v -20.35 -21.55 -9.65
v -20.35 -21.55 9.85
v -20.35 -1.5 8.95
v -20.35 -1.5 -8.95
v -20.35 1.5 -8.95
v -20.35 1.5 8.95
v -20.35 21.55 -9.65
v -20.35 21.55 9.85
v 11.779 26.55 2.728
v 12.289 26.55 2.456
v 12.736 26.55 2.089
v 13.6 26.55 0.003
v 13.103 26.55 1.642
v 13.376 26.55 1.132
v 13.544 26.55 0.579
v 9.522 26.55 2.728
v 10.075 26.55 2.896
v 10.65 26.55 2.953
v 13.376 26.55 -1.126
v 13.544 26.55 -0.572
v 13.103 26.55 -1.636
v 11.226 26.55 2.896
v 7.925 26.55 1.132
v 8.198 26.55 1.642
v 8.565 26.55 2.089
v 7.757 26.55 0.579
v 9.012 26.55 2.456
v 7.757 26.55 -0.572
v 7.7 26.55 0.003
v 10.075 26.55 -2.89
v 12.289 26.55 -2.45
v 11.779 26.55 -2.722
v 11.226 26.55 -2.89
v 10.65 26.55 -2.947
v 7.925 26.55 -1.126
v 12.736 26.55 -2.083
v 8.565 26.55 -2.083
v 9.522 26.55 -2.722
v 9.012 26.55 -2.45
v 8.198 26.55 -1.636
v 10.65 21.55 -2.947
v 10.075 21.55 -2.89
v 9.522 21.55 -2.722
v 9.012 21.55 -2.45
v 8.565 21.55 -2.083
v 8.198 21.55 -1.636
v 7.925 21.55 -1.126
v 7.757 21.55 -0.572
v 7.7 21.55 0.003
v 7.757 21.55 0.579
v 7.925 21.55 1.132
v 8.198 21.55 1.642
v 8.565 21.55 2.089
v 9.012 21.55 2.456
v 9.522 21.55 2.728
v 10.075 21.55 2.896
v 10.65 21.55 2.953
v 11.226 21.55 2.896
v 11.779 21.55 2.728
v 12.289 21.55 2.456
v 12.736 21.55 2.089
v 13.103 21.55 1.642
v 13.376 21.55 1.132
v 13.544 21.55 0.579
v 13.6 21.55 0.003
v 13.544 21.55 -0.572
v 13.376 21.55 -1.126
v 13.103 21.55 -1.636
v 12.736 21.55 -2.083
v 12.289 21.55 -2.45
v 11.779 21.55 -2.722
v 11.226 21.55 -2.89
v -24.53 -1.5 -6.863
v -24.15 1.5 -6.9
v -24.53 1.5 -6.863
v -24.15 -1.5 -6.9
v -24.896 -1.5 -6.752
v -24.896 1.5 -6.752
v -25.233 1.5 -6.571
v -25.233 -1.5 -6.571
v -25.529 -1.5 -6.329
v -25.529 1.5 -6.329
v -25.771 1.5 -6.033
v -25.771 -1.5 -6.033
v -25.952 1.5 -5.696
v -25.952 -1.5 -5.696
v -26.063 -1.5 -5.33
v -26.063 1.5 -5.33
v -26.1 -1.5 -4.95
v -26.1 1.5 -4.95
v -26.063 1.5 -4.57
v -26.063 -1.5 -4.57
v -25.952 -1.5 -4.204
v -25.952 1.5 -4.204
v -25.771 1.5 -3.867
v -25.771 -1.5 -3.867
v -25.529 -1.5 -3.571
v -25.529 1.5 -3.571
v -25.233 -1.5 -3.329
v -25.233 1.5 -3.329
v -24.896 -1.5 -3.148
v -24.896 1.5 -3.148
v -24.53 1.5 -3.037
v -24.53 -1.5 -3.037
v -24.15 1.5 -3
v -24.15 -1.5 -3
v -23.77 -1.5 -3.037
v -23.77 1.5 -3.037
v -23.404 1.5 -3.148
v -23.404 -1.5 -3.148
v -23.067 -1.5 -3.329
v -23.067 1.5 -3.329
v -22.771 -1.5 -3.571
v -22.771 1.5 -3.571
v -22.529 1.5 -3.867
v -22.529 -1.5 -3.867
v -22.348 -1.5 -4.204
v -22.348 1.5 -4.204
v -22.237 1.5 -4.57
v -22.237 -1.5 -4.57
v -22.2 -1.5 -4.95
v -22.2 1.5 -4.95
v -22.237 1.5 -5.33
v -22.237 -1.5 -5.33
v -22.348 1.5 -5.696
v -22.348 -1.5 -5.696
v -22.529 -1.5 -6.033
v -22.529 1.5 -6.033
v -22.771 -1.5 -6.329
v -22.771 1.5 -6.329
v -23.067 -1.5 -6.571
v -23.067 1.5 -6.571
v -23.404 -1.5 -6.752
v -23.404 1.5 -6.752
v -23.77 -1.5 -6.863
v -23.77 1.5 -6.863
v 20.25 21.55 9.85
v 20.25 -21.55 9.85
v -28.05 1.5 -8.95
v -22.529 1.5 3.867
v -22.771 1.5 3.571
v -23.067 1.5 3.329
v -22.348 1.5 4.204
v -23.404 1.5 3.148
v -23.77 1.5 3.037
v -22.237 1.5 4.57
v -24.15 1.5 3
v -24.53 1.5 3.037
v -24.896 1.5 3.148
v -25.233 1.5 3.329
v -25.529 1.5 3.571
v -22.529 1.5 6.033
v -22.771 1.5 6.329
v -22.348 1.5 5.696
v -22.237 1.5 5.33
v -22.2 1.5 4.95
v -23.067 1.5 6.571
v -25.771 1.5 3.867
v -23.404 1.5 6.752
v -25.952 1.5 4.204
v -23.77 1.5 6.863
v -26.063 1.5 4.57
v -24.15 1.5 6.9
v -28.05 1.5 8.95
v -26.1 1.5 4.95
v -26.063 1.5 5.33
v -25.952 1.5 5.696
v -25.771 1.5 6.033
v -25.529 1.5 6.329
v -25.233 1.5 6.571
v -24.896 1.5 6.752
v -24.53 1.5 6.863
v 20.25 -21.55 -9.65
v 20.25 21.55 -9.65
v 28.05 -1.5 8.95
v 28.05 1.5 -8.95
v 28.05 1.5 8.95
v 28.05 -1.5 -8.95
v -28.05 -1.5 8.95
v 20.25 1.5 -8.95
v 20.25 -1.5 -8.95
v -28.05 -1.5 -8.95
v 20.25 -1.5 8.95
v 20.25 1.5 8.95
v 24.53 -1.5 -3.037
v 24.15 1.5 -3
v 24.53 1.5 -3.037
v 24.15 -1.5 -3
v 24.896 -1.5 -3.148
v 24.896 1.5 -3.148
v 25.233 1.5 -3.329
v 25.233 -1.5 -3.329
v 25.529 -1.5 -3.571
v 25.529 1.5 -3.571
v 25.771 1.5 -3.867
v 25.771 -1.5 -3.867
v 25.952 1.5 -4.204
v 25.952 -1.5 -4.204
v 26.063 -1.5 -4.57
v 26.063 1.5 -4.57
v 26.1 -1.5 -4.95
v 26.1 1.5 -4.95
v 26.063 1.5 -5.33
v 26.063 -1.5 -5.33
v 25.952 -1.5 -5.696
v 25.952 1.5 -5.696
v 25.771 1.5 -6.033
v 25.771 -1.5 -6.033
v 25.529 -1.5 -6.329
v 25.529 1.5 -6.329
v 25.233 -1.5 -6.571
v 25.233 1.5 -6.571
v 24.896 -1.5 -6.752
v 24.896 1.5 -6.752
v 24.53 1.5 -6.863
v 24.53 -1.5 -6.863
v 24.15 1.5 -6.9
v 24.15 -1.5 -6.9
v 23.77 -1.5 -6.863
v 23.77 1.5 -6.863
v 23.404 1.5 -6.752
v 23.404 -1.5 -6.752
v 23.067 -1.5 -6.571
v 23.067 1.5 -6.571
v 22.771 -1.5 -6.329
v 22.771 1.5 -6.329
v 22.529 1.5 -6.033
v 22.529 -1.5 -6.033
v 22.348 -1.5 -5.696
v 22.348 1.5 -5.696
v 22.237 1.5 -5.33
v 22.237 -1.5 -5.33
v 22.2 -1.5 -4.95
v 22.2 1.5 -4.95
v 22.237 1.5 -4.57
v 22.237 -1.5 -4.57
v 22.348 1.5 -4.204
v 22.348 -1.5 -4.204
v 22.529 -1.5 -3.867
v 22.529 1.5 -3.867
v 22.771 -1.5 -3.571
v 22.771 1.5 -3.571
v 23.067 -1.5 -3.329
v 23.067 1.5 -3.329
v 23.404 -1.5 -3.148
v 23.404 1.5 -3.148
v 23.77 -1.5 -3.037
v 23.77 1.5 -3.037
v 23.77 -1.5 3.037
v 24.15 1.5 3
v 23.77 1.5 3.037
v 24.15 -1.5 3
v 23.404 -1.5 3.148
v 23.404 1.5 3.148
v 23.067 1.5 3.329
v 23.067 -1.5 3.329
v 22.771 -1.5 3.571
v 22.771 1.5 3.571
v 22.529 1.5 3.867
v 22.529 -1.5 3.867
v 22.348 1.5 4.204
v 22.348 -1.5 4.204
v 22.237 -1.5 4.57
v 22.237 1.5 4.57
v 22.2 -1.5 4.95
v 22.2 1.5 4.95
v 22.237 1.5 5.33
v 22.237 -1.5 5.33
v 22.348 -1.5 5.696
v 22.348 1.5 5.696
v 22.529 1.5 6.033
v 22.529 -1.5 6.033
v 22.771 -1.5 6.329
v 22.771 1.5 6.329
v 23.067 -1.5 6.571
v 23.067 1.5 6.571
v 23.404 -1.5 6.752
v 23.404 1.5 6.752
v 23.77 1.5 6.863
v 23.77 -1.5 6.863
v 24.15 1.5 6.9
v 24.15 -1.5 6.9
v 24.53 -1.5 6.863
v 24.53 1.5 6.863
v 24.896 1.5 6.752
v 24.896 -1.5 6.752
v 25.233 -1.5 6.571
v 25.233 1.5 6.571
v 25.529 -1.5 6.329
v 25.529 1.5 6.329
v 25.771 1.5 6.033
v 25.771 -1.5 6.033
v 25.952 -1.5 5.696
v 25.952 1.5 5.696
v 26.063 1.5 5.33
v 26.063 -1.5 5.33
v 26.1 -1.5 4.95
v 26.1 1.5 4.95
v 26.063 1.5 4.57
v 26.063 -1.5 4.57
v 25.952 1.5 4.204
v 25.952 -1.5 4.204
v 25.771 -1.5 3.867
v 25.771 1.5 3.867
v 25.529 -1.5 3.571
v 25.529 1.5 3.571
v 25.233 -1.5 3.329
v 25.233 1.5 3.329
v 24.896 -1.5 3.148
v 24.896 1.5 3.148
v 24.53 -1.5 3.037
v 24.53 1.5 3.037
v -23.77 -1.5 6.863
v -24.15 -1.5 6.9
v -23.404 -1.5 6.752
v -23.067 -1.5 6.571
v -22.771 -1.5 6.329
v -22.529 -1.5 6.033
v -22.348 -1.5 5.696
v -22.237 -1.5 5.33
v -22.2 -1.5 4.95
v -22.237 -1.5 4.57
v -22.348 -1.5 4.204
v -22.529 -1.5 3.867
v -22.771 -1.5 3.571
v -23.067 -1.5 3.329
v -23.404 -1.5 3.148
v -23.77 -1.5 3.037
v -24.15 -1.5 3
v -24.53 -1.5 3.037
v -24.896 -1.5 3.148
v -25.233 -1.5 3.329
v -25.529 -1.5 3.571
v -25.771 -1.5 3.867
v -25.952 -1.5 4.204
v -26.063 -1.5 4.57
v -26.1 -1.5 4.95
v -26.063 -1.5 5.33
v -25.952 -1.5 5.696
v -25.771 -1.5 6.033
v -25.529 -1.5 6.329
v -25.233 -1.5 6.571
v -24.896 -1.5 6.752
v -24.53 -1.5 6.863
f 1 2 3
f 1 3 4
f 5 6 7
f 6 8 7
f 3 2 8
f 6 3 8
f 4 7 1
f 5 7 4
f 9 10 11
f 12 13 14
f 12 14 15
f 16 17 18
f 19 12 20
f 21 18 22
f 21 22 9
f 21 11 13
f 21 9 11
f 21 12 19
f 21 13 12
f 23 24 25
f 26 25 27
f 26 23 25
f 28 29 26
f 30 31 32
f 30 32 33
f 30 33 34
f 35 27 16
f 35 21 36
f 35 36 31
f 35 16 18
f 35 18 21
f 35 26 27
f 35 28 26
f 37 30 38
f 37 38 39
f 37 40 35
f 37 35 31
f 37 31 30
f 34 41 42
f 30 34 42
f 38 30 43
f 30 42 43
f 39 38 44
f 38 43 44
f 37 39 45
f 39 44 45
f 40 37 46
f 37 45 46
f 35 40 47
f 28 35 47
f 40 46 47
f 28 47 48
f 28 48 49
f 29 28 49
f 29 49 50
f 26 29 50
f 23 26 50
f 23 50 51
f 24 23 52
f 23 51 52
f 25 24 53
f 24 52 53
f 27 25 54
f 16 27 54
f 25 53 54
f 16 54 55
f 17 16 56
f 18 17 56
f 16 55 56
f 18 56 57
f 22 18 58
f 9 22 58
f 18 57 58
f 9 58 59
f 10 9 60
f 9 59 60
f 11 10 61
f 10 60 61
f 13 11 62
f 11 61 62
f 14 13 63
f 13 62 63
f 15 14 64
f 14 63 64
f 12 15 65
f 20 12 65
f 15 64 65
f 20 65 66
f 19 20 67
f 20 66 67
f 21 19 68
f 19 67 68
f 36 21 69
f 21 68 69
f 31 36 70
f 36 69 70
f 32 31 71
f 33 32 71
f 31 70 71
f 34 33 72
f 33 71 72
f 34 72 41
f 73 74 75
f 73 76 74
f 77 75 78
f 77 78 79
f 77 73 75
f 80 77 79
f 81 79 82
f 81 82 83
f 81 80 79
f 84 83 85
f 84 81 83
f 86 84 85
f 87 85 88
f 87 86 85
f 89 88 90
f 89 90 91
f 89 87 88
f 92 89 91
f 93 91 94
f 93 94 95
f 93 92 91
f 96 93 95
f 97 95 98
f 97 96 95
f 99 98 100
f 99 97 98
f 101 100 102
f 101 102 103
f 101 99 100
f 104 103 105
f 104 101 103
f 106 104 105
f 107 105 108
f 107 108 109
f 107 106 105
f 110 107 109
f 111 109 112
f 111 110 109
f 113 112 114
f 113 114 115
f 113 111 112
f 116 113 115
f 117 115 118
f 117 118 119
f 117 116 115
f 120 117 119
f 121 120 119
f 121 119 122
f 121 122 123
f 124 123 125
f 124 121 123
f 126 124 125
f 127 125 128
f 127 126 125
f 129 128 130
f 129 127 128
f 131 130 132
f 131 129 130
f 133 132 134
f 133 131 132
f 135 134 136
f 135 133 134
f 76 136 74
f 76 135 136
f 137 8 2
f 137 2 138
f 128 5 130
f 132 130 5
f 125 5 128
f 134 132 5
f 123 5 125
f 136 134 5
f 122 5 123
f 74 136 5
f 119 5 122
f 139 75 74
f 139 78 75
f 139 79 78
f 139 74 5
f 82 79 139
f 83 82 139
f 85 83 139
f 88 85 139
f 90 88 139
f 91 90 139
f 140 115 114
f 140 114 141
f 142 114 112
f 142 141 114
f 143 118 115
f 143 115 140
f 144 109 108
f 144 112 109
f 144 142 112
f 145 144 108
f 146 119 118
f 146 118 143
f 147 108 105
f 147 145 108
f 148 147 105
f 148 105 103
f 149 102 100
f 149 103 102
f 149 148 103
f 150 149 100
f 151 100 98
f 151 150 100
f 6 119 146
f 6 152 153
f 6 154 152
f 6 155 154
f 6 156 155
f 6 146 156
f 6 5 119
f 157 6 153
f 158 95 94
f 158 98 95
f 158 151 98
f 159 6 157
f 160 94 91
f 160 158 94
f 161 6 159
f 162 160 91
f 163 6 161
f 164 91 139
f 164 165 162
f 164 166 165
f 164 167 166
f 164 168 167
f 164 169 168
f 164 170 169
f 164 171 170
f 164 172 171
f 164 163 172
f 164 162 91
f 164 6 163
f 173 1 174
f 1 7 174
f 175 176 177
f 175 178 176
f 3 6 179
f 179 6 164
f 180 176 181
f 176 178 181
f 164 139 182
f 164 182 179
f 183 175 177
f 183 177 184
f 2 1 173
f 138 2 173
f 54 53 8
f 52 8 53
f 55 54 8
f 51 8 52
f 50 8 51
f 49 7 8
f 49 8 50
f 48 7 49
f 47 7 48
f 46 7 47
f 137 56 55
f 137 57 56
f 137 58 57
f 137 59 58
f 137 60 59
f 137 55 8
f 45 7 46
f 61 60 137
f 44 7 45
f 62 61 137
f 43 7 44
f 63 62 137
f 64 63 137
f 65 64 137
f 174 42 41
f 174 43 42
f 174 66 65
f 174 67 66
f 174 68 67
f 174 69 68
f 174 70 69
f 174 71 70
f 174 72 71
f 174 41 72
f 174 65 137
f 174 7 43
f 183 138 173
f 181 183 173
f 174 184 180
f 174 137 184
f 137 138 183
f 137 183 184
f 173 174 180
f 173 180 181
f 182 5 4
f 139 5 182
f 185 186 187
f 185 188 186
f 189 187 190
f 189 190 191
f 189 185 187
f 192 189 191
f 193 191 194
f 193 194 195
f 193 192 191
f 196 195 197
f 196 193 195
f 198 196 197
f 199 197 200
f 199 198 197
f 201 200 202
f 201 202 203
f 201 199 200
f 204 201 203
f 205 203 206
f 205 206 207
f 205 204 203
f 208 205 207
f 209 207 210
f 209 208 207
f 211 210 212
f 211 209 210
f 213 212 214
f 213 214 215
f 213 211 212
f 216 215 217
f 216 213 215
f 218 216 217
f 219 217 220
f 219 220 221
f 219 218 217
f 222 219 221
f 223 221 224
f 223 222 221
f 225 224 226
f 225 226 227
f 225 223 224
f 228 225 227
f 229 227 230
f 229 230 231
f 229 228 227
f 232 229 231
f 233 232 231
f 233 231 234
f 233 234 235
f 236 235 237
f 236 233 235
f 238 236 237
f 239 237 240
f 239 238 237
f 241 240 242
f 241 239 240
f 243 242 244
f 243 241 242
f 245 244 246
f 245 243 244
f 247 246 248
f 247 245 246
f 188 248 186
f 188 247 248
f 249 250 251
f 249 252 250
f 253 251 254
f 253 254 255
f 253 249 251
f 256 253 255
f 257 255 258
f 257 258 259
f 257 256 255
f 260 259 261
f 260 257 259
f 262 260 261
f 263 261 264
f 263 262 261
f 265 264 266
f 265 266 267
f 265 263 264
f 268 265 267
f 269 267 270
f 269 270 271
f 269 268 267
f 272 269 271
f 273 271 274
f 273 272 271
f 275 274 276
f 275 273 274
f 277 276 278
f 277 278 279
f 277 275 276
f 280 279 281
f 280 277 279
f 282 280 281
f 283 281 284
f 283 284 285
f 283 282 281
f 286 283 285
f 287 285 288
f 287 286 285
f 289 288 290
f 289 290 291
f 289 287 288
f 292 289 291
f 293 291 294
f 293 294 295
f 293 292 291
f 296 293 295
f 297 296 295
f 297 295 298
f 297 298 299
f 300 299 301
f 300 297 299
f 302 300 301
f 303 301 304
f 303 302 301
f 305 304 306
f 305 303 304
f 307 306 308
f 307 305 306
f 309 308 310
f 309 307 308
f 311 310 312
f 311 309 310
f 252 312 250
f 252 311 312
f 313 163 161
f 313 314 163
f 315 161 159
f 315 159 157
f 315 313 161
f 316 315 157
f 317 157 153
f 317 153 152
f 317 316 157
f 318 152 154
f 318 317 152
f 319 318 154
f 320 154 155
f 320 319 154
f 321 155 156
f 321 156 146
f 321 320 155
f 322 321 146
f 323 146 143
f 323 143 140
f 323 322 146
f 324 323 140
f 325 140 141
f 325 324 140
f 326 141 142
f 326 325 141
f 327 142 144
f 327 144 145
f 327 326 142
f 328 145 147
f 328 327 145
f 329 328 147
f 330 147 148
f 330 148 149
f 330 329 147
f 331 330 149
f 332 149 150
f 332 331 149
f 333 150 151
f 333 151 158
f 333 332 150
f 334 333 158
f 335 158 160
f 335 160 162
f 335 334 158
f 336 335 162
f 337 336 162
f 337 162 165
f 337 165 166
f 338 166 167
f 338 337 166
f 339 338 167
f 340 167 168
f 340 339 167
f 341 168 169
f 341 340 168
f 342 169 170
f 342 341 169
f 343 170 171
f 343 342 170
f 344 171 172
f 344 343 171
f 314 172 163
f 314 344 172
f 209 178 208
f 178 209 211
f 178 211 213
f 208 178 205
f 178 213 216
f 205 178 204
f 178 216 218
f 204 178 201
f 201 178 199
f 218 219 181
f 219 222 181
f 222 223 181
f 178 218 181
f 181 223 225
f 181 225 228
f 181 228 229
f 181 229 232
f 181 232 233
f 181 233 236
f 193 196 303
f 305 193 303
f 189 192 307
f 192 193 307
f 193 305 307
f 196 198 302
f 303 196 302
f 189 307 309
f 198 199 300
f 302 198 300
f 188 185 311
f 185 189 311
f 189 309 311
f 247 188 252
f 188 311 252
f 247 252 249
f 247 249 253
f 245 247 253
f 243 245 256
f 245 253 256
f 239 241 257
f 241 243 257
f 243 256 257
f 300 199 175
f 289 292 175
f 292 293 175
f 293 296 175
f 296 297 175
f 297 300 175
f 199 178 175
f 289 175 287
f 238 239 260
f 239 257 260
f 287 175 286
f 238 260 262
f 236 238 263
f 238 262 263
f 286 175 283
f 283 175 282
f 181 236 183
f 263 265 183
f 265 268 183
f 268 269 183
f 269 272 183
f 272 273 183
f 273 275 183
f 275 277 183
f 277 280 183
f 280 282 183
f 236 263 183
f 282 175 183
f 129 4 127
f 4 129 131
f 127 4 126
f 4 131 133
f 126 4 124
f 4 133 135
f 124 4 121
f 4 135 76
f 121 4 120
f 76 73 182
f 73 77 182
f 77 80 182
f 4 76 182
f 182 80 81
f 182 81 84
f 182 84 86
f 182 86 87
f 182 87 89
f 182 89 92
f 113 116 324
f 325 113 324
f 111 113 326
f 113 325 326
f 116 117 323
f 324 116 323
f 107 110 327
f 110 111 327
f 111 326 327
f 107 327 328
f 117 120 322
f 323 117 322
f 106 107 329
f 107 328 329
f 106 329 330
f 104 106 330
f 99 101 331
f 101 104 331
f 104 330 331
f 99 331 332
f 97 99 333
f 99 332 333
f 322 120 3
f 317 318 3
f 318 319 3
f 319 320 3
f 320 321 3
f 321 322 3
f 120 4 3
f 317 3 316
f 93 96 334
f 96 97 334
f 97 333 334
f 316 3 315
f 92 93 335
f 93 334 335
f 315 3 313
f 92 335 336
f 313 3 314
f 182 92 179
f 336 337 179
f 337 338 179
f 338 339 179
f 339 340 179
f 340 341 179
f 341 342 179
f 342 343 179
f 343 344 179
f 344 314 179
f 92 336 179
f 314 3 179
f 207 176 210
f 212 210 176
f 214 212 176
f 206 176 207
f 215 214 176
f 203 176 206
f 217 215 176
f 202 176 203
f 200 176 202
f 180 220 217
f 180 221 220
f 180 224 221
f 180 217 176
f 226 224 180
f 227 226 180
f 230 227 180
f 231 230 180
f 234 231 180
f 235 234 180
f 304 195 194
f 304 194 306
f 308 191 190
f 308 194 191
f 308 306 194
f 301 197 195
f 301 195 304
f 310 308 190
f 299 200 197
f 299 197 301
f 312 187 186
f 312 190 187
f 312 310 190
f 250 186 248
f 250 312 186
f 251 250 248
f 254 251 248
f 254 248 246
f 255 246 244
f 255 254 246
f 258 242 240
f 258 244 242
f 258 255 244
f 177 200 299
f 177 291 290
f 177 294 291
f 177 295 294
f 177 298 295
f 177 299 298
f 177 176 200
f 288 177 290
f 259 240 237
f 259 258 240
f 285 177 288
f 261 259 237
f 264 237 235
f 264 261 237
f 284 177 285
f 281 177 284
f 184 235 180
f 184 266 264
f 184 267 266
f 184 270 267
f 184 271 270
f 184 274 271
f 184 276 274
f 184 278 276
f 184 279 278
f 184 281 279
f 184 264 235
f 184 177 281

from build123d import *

# Parameters (mm, degrees)
CROQUIS1_W              = 40.6
CROQUIS1_H              = 19.5
EXTRUIR1_DEPTH          = 21.55
CROQUIS2_R              = 2.95
EXTRUIR2_DEPTH          = 5
CROQUIS4_W              = 7.8
CROQUIS4_H              = 17.9
CROQUIS4_R              = 1.95
SALIENTE_EXTRUIR1_DEPTH = 1.5


with BuildPart() as part:
    # Croquis1 → Extruir1 (new, symmetric)
    with BuildSketch(Plane(origin=(0, 0, 0), x_dir=(1, 0, 0), z_dir=(0, 1, 0))):
        with Locations((-0.05, -0.1)):
            Rectangle(CROQUIS1_W, CROQUIS1_H)
    extrude(amount=EXTRUIR1_DEPTH, both=True)

    # Croquis2 → Extruir2 (add)
    with BuildSketch(Plane(origin=(0, 21.55, 0), x_dir=(1, 0, 0), z_dir=(0, 1, 0))):
        with Locations(Location((10.650489708, -0.00303525, 0), (0, 0, 90))):
            Circle(CROQUIS2_R)
    extrude(amount=EXTRUIR2_DEPTH)

    # Croquis4 → Saliente-Extruir1 (add, symmetric)
    # profile 1 of 2: a face of its own
    with BuildSketch(Plane(origin=(0, 0, 0), x_dir=(-1, 0, 0), z_dir=(0, 1, 0))):
        with Locations((-24.15, 0)):
            Rectangle(CROQUIS4_W, CROQUIS4_H)
        with Locations(Location((-24.15, -4.95, 0), (0, 0, 90))):
            Circle(CROQUIS4_R, mode=Mode.SUBTRACT)
        with Locations(Location((-24.15, 4.95, 0), (0, 0, 270))):
            Circle(CROQUIS4_R, mode=Mode.SUBTRACT)
    # profile 2 of 2: a face of its own
    with BuildSketch(Plane(origin=(0, 0, 0), x_dir=(-1, 0, 0), z_dir=(0, 1, 0))):
        with Locations((24.15, 0)):
            Rectangle(CROQUIS4_W, CROQUIS4_H)
        with Locations(Location((24.15, -4.95, 0), (0, 0, 270))):
            Circle(CROQUIS4_R, mode=Mode.SUBTRACT)
        with Locations(Location((24.15, 4.95, 0), (0, 0, 90))):
            Circle(CROQUIS4_R, mode=Mode.SUBTRACT)
    extrude(amount=SALIENTE_EXTRUIR1_DEPTH, both=True)


solid = part.part
